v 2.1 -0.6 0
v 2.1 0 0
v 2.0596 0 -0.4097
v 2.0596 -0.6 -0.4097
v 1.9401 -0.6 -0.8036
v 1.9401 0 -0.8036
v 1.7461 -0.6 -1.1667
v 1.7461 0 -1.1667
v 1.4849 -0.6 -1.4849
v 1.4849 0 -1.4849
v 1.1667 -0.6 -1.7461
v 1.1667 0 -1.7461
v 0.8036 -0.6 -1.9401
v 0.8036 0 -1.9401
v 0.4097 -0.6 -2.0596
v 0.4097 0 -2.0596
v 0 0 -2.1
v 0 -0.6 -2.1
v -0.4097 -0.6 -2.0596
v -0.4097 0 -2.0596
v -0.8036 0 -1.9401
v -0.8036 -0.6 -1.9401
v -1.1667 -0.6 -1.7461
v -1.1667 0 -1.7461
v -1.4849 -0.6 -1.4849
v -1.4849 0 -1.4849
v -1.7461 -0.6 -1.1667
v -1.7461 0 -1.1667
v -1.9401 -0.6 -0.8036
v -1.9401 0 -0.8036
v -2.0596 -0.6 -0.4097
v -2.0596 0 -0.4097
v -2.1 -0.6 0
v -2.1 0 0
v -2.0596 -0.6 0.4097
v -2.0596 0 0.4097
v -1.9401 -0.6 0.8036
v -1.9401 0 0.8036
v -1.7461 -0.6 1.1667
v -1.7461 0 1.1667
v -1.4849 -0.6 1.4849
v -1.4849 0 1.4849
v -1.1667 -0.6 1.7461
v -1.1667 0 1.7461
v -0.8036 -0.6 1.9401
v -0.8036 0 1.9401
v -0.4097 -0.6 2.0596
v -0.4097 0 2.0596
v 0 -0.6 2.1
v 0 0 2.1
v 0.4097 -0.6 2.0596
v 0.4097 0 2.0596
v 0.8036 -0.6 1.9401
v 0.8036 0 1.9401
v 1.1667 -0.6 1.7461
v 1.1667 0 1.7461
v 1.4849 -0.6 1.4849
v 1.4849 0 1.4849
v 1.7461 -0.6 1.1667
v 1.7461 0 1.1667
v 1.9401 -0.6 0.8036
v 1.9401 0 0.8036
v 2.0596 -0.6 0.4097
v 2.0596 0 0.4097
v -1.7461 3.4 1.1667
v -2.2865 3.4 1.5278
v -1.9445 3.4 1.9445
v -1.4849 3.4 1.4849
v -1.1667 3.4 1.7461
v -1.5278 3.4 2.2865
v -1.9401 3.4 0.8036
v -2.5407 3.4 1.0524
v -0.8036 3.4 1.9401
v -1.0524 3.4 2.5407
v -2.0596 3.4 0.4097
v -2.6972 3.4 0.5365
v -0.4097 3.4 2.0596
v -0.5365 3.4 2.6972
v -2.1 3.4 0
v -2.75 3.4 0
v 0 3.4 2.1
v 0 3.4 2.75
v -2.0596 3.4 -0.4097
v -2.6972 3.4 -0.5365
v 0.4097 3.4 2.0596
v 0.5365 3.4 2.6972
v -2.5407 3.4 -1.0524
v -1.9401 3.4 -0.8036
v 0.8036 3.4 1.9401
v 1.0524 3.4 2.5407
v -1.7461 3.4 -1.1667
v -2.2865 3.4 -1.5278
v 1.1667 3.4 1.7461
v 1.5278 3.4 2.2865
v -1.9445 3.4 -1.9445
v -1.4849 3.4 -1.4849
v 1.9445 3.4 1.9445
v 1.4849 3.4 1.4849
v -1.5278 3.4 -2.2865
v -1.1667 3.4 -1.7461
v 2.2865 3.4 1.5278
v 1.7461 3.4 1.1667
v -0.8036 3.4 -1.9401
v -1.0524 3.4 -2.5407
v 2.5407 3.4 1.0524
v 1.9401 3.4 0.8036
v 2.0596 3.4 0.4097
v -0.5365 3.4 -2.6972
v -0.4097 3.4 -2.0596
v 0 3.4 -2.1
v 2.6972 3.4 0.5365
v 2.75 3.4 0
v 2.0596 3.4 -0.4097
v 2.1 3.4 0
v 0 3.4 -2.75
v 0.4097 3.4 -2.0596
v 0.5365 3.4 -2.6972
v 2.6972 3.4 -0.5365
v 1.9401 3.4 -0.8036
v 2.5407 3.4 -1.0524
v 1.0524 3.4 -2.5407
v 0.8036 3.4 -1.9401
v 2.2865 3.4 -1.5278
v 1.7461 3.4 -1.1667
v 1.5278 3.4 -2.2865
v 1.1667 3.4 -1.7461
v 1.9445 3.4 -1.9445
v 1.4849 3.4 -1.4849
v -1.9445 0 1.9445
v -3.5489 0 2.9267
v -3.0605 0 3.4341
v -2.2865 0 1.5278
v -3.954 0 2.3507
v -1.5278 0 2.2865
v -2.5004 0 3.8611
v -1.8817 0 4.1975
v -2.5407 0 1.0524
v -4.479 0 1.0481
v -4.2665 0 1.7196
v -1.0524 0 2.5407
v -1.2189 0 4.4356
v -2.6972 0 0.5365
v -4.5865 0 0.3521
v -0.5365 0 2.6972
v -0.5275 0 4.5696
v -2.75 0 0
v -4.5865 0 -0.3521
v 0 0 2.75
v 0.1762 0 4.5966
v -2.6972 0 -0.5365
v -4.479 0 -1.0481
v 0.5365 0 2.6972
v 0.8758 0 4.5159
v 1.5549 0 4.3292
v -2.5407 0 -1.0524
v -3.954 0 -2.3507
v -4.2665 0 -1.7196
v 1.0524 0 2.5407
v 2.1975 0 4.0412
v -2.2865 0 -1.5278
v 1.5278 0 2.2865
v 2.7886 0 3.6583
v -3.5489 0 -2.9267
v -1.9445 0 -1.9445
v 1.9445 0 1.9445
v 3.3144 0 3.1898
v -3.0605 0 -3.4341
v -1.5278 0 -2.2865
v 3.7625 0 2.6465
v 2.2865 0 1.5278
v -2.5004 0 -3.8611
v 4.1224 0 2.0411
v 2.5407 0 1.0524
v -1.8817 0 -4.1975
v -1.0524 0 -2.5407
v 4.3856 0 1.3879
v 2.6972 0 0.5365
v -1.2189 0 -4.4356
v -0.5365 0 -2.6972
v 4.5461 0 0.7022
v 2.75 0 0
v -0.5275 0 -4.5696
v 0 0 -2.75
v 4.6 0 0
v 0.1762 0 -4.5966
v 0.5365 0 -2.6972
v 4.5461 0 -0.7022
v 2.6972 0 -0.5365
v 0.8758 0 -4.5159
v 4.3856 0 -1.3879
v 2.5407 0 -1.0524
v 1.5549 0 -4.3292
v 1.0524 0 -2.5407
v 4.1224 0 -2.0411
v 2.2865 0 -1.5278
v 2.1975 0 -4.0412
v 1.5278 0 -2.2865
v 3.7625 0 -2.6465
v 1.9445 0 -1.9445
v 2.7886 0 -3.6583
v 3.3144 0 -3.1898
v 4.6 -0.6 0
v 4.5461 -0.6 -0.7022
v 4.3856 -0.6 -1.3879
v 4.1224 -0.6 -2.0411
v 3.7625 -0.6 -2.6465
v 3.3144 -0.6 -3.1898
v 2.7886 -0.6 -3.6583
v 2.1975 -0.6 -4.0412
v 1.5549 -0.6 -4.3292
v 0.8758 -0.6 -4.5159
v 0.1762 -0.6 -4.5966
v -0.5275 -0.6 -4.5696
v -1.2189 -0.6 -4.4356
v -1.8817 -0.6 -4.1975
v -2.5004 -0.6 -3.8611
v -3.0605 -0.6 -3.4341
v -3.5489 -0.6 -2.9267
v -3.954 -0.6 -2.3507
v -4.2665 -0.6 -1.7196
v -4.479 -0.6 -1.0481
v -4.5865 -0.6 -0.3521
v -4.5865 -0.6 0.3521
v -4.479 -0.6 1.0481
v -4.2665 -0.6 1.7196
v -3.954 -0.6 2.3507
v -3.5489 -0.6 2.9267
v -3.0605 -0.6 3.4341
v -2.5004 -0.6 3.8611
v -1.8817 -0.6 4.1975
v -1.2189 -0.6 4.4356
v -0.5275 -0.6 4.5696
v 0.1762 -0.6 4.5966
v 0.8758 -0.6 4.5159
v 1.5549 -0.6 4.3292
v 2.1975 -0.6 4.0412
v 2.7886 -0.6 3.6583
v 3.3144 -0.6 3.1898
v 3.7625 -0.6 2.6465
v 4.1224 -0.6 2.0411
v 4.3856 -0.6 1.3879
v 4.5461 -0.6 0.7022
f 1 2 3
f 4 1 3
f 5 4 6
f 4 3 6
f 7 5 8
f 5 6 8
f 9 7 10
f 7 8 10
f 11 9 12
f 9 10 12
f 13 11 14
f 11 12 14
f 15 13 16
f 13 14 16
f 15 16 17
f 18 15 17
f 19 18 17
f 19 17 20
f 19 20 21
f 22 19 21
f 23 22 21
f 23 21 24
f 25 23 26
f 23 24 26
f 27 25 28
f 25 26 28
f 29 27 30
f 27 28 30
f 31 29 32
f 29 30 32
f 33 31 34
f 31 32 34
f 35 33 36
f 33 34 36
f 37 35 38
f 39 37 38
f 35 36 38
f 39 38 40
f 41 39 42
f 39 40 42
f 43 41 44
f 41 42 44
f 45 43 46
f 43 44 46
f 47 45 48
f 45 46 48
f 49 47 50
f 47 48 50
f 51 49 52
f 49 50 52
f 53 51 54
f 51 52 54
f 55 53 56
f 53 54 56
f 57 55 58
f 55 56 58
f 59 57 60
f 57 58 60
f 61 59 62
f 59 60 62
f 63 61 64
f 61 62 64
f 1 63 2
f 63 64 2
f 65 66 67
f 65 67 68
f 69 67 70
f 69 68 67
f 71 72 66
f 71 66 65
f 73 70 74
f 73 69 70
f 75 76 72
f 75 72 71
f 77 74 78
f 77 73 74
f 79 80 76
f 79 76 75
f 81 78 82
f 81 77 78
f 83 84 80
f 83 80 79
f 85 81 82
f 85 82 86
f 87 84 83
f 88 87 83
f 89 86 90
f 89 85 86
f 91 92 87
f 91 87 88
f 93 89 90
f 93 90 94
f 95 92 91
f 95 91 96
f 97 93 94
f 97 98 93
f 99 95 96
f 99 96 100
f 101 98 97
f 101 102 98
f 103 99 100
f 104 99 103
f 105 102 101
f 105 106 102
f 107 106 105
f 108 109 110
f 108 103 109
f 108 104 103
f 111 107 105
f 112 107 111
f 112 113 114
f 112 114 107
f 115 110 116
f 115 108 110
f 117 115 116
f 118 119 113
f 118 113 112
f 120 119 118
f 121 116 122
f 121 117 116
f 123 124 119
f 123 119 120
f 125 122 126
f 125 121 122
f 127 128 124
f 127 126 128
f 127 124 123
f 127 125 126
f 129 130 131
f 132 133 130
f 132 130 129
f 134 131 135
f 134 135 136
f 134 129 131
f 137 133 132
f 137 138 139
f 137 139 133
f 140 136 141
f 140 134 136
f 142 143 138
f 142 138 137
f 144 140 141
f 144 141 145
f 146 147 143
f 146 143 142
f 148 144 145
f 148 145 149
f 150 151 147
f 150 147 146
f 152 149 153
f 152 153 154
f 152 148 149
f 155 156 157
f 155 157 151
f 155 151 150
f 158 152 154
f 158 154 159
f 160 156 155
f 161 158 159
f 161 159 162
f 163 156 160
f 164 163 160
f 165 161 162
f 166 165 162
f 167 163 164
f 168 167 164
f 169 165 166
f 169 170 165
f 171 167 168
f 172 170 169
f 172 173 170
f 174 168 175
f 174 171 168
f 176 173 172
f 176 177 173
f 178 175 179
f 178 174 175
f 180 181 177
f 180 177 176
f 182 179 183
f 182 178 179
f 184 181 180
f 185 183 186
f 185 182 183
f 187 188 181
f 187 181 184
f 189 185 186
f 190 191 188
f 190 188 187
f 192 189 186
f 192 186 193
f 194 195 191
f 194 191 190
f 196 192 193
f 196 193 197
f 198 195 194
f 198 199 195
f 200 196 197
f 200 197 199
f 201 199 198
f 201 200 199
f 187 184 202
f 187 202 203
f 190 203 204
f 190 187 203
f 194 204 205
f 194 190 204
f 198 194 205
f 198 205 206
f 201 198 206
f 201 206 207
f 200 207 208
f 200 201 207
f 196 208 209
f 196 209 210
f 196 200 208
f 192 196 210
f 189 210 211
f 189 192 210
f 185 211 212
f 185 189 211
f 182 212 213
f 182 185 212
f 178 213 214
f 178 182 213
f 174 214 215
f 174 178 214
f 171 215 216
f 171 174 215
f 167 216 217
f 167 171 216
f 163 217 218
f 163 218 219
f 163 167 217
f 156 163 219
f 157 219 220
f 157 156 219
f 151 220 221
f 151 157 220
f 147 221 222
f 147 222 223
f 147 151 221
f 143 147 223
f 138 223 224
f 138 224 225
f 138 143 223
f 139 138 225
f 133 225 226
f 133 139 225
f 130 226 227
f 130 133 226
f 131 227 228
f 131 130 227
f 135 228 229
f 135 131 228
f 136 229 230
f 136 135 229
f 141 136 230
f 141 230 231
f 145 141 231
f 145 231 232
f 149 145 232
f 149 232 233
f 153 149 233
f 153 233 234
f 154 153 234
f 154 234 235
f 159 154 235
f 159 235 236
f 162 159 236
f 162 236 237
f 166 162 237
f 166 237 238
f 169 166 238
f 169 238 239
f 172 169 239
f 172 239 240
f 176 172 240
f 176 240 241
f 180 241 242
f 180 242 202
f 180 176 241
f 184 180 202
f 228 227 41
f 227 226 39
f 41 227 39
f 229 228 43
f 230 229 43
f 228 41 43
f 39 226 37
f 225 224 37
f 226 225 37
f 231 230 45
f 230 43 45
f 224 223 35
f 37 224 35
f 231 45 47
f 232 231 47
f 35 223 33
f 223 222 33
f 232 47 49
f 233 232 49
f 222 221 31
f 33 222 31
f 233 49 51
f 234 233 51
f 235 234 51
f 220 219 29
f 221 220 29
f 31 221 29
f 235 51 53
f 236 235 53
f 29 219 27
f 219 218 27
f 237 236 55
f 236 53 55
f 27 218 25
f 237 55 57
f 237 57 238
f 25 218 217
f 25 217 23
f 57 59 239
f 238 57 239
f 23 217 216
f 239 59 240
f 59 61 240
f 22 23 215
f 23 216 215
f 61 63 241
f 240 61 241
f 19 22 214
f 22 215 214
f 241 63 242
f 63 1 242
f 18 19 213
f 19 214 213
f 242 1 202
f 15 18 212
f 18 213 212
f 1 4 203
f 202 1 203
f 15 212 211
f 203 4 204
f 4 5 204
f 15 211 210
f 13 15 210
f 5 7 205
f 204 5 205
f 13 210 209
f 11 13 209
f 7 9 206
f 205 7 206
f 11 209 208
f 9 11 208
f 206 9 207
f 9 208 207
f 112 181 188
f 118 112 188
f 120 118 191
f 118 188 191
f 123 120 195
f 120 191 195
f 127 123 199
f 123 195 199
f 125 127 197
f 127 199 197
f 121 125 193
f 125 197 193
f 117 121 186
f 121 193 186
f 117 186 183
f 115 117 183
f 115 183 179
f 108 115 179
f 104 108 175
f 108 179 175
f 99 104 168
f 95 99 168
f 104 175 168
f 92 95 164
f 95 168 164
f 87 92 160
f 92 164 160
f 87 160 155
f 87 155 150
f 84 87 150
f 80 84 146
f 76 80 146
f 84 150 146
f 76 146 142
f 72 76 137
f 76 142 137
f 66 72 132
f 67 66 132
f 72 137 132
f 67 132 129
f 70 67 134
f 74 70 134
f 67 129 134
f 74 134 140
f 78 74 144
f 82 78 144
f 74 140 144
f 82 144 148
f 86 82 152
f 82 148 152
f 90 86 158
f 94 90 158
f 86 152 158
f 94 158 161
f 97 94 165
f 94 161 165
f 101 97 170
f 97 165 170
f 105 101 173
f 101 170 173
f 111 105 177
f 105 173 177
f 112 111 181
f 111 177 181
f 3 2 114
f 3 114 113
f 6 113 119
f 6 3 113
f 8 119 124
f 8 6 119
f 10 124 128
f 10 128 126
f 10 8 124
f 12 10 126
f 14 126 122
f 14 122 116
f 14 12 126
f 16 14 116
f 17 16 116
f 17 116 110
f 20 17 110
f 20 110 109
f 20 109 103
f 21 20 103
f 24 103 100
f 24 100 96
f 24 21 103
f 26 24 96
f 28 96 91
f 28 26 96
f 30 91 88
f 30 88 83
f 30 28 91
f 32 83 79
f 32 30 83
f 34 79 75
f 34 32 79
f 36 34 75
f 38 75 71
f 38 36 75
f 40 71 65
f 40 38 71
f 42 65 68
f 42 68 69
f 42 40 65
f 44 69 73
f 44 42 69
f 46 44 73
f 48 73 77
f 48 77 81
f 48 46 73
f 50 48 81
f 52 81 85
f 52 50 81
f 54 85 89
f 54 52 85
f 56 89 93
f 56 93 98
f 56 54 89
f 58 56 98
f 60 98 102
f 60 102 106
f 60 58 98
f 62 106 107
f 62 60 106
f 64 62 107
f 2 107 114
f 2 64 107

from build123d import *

# Parameters (mm, degrees)
SKETCH_1_R      = 2.75
SKETCH_1_R_2    = 2.1
EXTRUDE_1_DEPTH = 3.4
EXTRUDE_START   = -0.6
SKETCH_1_3_R    = 4.6
SKETCH_1_3_R_2  = 2.1
EXTRUDE_2_DEPTH = 0.6


with BuildPart() as part:
    # 草图1 → 凸台-拉伸1 (new body)
    with BuildSketch(Plane(origin=(0, 0, 0), x_dir=(1, 0, 0), z_dir=(0, 1, 0))):
        Circle(SKETCH_1_R)
        Circle(SKETCH_1_R_2, mode=Mode.SUBTRACT)
    extrude(amount=EXTRUDE_1_DEPTH)

    # 草图1<3> → 凸台-拉伸2 (add)
    with BuildSketch(Plane(origin=(0, 0, 0), x_dir=(1, 0, 0), z_dir=(0, 1, 0)).offset(EXTRUDE_START)):
        Circle(SKETCH_1_3_R)
        Circle(SKETCH_1_3_R_2, mode=Mode.SUBTRACT)
    extrude(amount=EXTRUDE_2_DEPTH)


solid = part.part
